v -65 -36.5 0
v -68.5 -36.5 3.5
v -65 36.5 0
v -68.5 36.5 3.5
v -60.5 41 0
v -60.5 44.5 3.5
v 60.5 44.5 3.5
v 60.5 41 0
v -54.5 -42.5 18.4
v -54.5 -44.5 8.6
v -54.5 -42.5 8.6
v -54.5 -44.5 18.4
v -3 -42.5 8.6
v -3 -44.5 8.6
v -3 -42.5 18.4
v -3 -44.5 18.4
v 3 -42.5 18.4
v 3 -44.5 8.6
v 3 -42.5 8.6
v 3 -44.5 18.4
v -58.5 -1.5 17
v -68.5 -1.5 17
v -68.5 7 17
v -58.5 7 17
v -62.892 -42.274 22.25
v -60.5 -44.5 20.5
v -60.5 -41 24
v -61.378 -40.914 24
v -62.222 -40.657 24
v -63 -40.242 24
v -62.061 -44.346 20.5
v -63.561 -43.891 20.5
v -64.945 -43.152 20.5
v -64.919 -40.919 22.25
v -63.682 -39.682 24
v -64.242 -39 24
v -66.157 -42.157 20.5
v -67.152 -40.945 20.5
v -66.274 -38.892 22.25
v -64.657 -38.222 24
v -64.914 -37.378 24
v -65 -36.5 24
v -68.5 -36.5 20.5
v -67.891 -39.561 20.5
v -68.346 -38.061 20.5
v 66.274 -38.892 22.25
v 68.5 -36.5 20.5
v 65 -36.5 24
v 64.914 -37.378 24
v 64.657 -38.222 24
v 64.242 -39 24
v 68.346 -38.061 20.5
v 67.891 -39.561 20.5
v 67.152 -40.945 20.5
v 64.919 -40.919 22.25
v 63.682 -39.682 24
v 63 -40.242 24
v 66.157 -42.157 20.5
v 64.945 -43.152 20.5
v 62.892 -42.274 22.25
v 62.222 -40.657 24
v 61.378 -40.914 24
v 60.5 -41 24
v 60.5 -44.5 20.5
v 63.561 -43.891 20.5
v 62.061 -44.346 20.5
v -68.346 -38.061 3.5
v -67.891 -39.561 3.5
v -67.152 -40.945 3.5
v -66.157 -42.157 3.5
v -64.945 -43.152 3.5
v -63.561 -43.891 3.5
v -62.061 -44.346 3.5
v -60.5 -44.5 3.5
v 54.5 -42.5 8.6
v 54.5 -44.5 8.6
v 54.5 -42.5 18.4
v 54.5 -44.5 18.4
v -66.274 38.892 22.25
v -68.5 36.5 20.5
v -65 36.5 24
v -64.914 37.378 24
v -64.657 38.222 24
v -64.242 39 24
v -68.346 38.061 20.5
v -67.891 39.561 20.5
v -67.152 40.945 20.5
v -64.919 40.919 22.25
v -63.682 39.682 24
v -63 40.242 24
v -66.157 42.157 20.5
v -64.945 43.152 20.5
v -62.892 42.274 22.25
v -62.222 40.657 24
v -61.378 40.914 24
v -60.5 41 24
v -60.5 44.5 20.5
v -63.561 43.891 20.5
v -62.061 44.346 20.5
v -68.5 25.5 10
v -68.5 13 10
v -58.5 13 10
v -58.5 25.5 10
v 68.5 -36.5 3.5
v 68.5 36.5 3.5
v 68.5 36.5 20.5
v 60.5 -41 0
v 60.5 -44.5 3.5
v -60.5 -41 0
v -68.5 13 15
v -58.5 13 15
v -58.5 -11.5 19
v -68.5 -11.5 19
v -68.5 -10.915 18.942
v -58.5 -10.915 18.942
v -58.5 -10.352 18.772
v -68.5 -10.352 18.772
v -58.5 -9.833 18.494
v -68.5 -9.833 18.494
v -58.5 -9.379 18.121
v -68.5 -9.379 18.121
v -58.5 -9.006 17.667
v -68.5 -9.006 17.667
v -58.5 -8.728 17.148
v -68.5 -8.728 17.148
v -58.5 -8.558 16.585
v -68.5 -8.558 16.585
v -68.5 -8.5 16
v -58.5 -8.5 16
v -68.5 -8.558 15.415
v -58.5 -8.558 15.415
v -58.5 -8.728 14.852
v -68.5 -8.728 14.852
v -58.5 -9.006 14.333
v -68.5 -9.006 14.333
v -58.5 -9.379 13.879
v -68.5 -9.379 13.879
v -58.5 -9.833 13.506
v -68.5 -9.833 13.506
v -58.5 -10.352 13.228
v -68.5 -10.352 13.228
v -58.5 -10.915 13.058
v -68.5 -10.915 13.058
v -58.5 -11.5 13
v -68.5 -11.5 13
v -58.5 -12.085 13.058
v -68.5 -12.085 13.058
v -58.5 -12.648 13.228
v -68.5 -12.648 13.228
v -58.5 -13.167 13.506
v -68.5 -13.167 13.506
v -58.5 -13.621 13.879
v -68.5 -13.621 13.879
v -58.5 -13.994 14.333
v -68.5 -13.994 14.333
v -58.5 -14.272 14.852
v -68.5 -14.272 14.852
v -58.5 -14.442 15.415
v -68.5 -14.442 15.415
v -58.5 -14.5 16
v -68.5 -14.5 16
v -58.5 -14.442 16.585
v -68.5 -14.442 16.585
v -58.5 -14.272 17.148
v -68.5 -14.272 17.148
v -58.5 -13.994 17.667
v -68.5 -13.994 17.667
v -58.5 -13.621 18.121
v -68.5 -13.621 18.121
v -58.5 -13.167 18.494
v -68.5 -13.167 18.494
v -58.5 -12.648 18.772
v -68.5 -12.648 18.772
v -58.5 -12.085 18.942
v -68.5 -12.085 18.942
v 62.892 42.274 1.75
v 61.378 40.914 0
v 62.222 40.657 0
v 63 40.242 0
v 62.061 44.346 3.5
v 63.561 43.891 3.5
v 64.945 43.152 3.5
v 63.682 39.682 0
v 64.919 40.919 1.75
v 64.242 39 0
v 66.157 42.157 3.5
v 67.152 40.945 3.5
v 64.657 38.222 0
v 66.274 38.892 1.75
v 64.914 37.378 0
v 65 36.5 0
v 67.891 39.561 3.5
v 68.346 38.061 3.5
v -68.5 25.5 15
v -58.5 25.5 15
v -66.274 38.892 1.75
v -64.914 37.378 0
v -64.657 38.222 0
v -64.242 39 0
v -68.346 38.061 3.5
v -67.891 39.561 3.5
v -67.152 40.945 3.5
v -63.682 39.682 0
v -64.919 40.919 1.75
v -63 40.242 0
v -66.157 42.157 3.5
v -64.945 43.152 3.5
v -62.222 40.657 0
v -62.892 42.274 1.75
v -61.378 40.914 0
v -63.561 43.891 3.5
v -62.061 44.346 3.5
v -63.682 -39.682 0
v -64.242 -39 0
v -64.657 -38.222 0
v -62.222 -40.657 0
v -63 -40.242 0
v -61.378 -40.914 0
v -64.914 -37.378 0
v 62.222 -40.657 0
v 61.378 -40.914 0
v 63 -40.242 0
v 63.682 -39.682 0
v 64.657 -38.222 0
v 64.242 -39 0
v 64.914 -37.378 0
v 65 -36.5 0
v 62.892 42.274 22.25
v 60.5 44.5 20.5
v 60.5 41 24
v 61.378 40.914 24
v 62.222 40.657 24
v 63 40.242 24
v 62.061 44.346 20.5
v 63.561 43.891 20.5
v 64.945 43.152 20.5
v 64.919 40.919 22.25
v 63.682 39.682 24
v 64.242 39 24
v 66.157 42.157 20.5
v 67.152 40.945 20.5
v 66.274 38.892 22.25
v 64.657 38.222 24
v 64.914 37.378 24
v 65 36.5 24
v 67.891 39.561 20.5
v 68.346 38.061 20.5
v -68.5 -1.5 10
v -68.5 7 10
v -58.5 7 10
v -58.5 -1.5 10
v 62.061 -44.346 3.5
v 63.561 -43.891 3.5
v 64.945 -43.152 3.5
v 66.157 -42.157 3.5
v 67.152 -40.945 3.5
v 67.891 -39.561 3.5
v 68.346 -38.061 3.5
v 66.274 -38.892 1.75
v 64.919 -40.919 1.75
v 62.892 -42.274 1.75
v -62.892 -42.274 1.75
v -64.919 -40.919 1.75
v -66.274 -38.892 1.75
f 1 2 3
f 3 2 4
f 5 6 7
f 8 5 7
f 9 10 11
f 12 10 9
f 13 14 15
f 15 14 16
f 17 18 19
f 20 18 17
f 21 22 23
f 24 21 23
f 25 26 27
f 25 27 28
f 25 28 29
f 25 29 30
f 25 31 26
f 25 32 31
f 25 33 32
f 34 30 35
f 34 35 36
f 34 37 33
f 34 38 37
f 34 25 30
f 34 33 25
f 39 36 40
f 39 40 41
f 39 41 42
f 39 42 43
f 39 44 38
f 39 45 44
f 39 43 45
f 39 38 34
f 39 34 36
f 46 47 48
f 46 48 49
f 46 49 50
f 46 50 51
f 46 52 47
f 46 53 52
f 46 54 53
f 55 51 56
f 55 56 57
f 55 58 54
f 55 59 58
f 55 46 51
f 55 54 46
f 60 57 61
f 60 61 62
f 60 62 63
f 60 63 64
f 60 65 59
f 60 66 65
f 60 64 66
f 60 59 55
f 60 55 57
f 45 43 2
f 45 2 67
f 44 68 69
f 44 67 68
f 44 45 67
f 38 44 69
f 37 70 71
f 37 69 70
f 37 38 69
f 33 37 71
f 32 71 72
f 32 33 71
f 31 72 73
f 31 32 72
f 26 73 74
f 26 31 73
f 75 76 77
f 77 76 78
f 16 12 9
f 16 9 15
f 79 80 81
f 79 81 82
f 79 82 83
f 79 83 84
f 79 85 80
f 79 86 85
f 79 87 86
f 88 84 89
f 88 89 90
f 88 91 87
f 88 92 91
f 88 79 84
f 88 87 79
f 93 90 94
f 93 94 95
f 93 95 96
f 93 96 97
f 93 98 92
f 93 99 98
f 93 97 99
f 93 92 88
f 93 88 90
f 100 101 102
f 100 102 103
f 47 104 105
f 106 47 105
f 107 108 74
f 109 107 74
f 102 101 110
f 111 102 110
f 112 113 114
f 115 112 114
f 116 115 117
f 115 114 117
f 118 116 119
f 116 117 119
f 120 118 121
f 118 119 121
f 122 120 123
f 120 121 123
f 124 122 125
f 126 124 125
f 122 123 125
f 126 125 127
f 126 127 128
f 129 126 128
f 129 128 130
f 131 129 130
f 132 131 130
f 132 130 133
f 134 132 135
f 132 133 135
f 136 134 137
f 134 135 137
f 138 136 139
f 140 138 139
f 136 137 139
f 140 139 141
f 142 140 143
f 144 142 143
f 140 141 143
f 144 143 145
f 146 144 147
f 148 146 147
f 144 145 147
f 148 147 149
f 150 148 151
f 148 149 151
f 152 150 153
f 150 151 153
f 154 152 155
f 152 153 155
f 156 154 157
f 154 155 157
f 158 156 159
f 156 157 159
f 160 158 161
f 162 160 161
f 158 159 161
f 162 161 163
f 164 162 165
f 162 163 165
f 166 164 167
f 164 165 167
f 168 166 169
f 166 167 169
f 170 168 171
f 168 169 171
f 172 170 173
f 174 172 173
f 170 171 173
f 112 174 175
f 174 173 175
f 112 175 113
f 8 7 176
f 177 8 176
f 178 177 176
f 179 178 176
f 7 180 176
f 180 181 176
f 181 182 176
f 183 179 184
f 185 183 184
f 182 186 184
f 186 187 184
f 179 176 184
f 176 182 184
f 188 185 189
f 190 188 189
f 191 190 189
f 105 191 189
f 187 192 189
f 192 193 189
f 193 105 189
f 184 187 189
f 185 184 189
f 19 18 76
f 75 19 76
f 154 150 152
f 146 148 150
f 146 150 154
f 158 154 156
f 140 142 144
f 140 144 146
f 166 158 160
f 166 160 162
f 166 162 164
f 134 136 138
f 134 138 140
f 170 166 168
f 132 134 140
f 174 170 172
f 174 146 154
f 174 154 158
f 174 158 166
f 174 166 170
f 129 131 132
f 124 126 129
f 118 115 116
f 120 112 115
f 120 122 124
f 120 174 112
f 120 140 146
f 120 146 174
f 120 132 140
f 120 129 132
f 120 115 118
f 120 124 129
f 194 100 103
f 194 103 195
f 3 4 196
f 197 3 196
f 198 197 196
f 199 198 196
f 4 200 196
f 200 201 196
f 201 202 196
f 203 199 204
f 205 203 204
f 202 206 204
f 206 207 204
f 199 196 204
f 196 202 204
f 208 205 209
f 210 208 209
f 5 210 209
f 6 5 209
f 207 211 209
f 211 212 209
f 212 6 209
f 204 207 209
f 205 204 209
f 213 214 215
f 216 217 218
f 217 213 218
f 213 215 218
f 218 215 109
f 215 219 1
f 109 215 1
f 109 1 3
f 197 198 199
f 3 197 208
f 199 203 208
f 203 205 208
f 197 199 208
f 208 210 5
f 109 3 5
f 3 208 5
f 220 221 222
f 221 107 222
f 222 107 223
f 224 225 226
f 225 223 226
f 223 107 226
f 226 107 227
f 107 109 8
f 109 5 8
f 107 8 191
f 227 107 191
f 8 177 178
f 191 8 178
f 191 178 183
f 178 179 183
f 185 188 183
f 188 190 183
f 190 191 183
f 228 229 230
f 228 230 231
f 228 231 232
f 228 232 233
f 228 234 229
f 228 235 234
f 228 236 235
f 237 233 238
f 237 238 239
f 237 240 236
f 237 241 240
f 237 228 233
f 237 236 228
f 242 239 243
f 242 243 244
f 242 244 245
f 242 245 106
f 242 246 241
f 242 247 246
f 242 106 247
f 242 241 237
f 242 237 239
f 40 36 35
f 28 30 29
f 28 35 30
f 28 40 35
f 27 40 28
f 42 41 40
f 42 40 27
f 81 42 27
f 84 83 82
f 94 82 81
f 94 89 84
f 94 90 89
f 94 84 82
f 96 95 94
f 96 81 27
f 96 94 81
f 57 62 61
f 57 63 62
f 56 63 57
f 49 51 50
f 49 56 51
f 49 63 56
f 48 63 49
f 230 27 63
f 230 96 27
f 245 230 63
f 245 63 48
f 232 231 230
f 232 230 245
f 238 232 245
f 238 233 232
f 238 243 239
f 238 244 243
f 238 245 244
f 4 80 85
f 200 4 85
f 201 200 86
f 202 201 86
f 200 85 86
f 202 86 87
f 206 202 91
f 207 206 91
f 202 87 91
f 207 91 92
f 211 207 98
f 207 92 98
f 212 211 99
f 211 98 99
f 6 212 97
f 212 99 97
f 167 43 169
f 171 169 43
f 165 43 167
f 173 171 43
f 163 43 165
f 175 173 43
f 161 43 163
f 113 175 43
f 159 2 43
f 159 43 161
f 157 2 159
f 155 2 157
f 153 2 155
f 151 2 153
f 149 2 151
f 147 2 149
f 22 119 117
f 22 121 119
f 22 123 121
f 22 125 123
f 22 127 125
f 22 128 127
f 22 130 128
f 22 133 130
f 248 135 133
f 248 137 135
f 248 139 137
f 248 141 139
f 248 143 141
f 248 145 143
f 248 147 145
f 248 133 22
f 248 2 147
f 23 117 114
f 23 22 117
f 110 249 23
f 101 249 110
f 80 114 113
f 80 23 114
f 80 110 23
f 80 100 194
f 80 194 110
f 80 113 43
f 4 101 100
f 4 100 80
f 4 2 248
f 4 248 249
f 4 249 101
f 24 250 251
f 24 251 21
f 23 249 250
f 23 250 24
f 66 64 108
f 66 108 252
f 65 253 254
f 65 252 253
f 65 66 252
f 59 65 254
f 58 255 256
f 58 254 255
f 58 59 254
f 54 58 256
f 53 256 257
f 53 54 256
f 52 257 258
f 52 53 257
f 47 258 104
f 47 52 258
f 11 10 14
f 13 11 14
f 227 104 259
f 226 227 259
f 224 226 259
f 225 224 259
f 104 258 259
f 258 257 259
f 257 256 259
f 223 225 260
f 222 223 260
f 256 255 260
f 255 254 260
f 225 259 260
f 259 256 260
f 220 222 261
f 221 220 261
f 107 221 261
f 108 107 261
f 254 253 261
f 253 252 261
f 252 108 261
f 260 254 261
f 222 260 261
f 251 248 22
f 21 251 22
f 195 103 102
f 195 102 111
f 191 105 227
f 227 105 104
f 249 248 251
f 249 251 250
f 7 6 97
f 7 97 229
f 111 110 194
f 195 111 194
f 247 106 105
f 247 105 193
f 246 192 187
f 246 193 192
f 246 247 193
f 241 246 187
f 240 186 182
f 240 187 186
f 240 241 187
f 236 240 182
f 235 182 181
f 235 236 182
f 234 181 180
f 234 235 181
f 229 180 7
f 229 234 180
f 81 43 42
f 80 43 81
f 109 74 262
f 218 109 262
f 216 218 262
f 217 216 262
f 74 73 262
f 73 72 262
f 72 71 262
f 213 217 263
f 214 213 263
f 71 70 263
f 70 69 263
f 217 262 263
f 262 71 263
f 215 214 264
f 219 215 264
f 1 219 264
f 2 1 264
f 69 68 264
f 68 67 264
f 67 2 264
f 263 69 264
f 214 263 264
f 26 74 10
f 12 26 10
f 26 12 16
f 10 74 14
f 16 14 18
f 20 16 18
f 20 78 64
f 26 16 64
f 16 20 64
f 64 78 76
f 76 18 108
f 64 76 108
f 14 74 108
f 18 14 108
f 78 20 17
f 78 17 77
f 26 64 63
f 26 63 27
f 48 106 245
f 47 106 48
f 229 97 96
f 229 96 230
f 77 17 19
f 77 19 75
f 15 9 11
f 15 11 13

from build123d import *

# Parameters (mm, degrees)
SKETCH1_W           = 137
SKETCH1_H           = 89
BOSS_EXTRUDE1_DEPTH = 24
FILLET2_R           = 8
CHAMFER2_SIZE       = 3.5
SKETCH2_W           = 51.5
SKETCH2_H           = 9.8
CUT_EXTRUDE1_DEPTH  = 2
SKETCH3_R           = 3
SKETCH3_W           = 5
SKETCH3_H           = 12.5
SKETCH3_W_2         = 7
SKETCH3_H_2         = 8.5
CUT_EXTRUDE2_DEPTH  = 10


with BuildPart() as part:
    # Sketch1 → Boss-Extrude1 (new body)
    with BuildSketch(Plane.XY):
        Rectangle(SKETCH1_W, SKETCH1_H)
    extrude(amount=BOSS_EXTRUDE1_DEPTH)

    # Fillet2
    fillet2_edges = [part.edges().sort_by_distance(p)[0] for p in [
        (-68.5, 44.5, 12),
        (68.5, 44.5, 12),
        (68.5, -44.5, 12),
        (-68.5, -44.5, 12),
    ]]
    fillet(fillet2_edges, radius=FILLET2_R)

    # Chamfer2
    chamfer2_edges = [part.edges().sort_by_distance(p)[0] for p in [
        (0, 44.5, 0),
        (0, 44.5, 24),
        (-68.5, 0, 0),
        (68.5, 0, 0),
        (0, -44.5, 0),
        (-66.156854249, 42.156854249, 0),
        (-66.156854249, -42.156854249, 0),
        (66.156854249, -42.156854249, 0),
        (66.156854249, 42.156854249, 0),
        (68.5, 0, 24),
        (-68.5, 0, 24),
        (0, -44.5, 24),
        (-66.156854249, 42.156854249, 24),
        (-66.156854249, -42.156854249, 24),
        (66.156854249, -42.156854249, 24),
        (66.156854249, 42.156854249, 24),
    ]]
    chamfer(chamfer2_edges, length=CHAMFER2_SIZE)

    # Sketch2 → Cut-Extrude1 (cut)
    with BuildSketch(Plane.XZ.offset(44.5)):
        with Locations((-28.75, 13.5)):
            Rectangle(SKETCH2_W, SKETCH2_H)
        with Locations((28.75, 13.5)):
            Rectangle(SKETCH2_W, SKETCH2_H)
    extrude(amount=-CUT_EXTRUDE1_DEPTH, mode=Mode.SUBTRACT)

    # Sketch3 → Cut-Extrude2 (cut)
    with BuildSketch(Plane.ZY.offset(68.5)):
        with Locations((16, -11.5)):
            Circle(SKETCH3_R)
        with Locations((12.5, 19.25)):
            Rectangle(SKETCH3_W, SKETCH3_H)
        with Locations((13.5, 2.75)):
            Rectangle(SKETCH3_W_2, SKETCH3_H_2)
    extrude(amount=-CUT_EXTRUDE2_DEPTH, mode=Mode.SUBTRACT)


solid = part.part
